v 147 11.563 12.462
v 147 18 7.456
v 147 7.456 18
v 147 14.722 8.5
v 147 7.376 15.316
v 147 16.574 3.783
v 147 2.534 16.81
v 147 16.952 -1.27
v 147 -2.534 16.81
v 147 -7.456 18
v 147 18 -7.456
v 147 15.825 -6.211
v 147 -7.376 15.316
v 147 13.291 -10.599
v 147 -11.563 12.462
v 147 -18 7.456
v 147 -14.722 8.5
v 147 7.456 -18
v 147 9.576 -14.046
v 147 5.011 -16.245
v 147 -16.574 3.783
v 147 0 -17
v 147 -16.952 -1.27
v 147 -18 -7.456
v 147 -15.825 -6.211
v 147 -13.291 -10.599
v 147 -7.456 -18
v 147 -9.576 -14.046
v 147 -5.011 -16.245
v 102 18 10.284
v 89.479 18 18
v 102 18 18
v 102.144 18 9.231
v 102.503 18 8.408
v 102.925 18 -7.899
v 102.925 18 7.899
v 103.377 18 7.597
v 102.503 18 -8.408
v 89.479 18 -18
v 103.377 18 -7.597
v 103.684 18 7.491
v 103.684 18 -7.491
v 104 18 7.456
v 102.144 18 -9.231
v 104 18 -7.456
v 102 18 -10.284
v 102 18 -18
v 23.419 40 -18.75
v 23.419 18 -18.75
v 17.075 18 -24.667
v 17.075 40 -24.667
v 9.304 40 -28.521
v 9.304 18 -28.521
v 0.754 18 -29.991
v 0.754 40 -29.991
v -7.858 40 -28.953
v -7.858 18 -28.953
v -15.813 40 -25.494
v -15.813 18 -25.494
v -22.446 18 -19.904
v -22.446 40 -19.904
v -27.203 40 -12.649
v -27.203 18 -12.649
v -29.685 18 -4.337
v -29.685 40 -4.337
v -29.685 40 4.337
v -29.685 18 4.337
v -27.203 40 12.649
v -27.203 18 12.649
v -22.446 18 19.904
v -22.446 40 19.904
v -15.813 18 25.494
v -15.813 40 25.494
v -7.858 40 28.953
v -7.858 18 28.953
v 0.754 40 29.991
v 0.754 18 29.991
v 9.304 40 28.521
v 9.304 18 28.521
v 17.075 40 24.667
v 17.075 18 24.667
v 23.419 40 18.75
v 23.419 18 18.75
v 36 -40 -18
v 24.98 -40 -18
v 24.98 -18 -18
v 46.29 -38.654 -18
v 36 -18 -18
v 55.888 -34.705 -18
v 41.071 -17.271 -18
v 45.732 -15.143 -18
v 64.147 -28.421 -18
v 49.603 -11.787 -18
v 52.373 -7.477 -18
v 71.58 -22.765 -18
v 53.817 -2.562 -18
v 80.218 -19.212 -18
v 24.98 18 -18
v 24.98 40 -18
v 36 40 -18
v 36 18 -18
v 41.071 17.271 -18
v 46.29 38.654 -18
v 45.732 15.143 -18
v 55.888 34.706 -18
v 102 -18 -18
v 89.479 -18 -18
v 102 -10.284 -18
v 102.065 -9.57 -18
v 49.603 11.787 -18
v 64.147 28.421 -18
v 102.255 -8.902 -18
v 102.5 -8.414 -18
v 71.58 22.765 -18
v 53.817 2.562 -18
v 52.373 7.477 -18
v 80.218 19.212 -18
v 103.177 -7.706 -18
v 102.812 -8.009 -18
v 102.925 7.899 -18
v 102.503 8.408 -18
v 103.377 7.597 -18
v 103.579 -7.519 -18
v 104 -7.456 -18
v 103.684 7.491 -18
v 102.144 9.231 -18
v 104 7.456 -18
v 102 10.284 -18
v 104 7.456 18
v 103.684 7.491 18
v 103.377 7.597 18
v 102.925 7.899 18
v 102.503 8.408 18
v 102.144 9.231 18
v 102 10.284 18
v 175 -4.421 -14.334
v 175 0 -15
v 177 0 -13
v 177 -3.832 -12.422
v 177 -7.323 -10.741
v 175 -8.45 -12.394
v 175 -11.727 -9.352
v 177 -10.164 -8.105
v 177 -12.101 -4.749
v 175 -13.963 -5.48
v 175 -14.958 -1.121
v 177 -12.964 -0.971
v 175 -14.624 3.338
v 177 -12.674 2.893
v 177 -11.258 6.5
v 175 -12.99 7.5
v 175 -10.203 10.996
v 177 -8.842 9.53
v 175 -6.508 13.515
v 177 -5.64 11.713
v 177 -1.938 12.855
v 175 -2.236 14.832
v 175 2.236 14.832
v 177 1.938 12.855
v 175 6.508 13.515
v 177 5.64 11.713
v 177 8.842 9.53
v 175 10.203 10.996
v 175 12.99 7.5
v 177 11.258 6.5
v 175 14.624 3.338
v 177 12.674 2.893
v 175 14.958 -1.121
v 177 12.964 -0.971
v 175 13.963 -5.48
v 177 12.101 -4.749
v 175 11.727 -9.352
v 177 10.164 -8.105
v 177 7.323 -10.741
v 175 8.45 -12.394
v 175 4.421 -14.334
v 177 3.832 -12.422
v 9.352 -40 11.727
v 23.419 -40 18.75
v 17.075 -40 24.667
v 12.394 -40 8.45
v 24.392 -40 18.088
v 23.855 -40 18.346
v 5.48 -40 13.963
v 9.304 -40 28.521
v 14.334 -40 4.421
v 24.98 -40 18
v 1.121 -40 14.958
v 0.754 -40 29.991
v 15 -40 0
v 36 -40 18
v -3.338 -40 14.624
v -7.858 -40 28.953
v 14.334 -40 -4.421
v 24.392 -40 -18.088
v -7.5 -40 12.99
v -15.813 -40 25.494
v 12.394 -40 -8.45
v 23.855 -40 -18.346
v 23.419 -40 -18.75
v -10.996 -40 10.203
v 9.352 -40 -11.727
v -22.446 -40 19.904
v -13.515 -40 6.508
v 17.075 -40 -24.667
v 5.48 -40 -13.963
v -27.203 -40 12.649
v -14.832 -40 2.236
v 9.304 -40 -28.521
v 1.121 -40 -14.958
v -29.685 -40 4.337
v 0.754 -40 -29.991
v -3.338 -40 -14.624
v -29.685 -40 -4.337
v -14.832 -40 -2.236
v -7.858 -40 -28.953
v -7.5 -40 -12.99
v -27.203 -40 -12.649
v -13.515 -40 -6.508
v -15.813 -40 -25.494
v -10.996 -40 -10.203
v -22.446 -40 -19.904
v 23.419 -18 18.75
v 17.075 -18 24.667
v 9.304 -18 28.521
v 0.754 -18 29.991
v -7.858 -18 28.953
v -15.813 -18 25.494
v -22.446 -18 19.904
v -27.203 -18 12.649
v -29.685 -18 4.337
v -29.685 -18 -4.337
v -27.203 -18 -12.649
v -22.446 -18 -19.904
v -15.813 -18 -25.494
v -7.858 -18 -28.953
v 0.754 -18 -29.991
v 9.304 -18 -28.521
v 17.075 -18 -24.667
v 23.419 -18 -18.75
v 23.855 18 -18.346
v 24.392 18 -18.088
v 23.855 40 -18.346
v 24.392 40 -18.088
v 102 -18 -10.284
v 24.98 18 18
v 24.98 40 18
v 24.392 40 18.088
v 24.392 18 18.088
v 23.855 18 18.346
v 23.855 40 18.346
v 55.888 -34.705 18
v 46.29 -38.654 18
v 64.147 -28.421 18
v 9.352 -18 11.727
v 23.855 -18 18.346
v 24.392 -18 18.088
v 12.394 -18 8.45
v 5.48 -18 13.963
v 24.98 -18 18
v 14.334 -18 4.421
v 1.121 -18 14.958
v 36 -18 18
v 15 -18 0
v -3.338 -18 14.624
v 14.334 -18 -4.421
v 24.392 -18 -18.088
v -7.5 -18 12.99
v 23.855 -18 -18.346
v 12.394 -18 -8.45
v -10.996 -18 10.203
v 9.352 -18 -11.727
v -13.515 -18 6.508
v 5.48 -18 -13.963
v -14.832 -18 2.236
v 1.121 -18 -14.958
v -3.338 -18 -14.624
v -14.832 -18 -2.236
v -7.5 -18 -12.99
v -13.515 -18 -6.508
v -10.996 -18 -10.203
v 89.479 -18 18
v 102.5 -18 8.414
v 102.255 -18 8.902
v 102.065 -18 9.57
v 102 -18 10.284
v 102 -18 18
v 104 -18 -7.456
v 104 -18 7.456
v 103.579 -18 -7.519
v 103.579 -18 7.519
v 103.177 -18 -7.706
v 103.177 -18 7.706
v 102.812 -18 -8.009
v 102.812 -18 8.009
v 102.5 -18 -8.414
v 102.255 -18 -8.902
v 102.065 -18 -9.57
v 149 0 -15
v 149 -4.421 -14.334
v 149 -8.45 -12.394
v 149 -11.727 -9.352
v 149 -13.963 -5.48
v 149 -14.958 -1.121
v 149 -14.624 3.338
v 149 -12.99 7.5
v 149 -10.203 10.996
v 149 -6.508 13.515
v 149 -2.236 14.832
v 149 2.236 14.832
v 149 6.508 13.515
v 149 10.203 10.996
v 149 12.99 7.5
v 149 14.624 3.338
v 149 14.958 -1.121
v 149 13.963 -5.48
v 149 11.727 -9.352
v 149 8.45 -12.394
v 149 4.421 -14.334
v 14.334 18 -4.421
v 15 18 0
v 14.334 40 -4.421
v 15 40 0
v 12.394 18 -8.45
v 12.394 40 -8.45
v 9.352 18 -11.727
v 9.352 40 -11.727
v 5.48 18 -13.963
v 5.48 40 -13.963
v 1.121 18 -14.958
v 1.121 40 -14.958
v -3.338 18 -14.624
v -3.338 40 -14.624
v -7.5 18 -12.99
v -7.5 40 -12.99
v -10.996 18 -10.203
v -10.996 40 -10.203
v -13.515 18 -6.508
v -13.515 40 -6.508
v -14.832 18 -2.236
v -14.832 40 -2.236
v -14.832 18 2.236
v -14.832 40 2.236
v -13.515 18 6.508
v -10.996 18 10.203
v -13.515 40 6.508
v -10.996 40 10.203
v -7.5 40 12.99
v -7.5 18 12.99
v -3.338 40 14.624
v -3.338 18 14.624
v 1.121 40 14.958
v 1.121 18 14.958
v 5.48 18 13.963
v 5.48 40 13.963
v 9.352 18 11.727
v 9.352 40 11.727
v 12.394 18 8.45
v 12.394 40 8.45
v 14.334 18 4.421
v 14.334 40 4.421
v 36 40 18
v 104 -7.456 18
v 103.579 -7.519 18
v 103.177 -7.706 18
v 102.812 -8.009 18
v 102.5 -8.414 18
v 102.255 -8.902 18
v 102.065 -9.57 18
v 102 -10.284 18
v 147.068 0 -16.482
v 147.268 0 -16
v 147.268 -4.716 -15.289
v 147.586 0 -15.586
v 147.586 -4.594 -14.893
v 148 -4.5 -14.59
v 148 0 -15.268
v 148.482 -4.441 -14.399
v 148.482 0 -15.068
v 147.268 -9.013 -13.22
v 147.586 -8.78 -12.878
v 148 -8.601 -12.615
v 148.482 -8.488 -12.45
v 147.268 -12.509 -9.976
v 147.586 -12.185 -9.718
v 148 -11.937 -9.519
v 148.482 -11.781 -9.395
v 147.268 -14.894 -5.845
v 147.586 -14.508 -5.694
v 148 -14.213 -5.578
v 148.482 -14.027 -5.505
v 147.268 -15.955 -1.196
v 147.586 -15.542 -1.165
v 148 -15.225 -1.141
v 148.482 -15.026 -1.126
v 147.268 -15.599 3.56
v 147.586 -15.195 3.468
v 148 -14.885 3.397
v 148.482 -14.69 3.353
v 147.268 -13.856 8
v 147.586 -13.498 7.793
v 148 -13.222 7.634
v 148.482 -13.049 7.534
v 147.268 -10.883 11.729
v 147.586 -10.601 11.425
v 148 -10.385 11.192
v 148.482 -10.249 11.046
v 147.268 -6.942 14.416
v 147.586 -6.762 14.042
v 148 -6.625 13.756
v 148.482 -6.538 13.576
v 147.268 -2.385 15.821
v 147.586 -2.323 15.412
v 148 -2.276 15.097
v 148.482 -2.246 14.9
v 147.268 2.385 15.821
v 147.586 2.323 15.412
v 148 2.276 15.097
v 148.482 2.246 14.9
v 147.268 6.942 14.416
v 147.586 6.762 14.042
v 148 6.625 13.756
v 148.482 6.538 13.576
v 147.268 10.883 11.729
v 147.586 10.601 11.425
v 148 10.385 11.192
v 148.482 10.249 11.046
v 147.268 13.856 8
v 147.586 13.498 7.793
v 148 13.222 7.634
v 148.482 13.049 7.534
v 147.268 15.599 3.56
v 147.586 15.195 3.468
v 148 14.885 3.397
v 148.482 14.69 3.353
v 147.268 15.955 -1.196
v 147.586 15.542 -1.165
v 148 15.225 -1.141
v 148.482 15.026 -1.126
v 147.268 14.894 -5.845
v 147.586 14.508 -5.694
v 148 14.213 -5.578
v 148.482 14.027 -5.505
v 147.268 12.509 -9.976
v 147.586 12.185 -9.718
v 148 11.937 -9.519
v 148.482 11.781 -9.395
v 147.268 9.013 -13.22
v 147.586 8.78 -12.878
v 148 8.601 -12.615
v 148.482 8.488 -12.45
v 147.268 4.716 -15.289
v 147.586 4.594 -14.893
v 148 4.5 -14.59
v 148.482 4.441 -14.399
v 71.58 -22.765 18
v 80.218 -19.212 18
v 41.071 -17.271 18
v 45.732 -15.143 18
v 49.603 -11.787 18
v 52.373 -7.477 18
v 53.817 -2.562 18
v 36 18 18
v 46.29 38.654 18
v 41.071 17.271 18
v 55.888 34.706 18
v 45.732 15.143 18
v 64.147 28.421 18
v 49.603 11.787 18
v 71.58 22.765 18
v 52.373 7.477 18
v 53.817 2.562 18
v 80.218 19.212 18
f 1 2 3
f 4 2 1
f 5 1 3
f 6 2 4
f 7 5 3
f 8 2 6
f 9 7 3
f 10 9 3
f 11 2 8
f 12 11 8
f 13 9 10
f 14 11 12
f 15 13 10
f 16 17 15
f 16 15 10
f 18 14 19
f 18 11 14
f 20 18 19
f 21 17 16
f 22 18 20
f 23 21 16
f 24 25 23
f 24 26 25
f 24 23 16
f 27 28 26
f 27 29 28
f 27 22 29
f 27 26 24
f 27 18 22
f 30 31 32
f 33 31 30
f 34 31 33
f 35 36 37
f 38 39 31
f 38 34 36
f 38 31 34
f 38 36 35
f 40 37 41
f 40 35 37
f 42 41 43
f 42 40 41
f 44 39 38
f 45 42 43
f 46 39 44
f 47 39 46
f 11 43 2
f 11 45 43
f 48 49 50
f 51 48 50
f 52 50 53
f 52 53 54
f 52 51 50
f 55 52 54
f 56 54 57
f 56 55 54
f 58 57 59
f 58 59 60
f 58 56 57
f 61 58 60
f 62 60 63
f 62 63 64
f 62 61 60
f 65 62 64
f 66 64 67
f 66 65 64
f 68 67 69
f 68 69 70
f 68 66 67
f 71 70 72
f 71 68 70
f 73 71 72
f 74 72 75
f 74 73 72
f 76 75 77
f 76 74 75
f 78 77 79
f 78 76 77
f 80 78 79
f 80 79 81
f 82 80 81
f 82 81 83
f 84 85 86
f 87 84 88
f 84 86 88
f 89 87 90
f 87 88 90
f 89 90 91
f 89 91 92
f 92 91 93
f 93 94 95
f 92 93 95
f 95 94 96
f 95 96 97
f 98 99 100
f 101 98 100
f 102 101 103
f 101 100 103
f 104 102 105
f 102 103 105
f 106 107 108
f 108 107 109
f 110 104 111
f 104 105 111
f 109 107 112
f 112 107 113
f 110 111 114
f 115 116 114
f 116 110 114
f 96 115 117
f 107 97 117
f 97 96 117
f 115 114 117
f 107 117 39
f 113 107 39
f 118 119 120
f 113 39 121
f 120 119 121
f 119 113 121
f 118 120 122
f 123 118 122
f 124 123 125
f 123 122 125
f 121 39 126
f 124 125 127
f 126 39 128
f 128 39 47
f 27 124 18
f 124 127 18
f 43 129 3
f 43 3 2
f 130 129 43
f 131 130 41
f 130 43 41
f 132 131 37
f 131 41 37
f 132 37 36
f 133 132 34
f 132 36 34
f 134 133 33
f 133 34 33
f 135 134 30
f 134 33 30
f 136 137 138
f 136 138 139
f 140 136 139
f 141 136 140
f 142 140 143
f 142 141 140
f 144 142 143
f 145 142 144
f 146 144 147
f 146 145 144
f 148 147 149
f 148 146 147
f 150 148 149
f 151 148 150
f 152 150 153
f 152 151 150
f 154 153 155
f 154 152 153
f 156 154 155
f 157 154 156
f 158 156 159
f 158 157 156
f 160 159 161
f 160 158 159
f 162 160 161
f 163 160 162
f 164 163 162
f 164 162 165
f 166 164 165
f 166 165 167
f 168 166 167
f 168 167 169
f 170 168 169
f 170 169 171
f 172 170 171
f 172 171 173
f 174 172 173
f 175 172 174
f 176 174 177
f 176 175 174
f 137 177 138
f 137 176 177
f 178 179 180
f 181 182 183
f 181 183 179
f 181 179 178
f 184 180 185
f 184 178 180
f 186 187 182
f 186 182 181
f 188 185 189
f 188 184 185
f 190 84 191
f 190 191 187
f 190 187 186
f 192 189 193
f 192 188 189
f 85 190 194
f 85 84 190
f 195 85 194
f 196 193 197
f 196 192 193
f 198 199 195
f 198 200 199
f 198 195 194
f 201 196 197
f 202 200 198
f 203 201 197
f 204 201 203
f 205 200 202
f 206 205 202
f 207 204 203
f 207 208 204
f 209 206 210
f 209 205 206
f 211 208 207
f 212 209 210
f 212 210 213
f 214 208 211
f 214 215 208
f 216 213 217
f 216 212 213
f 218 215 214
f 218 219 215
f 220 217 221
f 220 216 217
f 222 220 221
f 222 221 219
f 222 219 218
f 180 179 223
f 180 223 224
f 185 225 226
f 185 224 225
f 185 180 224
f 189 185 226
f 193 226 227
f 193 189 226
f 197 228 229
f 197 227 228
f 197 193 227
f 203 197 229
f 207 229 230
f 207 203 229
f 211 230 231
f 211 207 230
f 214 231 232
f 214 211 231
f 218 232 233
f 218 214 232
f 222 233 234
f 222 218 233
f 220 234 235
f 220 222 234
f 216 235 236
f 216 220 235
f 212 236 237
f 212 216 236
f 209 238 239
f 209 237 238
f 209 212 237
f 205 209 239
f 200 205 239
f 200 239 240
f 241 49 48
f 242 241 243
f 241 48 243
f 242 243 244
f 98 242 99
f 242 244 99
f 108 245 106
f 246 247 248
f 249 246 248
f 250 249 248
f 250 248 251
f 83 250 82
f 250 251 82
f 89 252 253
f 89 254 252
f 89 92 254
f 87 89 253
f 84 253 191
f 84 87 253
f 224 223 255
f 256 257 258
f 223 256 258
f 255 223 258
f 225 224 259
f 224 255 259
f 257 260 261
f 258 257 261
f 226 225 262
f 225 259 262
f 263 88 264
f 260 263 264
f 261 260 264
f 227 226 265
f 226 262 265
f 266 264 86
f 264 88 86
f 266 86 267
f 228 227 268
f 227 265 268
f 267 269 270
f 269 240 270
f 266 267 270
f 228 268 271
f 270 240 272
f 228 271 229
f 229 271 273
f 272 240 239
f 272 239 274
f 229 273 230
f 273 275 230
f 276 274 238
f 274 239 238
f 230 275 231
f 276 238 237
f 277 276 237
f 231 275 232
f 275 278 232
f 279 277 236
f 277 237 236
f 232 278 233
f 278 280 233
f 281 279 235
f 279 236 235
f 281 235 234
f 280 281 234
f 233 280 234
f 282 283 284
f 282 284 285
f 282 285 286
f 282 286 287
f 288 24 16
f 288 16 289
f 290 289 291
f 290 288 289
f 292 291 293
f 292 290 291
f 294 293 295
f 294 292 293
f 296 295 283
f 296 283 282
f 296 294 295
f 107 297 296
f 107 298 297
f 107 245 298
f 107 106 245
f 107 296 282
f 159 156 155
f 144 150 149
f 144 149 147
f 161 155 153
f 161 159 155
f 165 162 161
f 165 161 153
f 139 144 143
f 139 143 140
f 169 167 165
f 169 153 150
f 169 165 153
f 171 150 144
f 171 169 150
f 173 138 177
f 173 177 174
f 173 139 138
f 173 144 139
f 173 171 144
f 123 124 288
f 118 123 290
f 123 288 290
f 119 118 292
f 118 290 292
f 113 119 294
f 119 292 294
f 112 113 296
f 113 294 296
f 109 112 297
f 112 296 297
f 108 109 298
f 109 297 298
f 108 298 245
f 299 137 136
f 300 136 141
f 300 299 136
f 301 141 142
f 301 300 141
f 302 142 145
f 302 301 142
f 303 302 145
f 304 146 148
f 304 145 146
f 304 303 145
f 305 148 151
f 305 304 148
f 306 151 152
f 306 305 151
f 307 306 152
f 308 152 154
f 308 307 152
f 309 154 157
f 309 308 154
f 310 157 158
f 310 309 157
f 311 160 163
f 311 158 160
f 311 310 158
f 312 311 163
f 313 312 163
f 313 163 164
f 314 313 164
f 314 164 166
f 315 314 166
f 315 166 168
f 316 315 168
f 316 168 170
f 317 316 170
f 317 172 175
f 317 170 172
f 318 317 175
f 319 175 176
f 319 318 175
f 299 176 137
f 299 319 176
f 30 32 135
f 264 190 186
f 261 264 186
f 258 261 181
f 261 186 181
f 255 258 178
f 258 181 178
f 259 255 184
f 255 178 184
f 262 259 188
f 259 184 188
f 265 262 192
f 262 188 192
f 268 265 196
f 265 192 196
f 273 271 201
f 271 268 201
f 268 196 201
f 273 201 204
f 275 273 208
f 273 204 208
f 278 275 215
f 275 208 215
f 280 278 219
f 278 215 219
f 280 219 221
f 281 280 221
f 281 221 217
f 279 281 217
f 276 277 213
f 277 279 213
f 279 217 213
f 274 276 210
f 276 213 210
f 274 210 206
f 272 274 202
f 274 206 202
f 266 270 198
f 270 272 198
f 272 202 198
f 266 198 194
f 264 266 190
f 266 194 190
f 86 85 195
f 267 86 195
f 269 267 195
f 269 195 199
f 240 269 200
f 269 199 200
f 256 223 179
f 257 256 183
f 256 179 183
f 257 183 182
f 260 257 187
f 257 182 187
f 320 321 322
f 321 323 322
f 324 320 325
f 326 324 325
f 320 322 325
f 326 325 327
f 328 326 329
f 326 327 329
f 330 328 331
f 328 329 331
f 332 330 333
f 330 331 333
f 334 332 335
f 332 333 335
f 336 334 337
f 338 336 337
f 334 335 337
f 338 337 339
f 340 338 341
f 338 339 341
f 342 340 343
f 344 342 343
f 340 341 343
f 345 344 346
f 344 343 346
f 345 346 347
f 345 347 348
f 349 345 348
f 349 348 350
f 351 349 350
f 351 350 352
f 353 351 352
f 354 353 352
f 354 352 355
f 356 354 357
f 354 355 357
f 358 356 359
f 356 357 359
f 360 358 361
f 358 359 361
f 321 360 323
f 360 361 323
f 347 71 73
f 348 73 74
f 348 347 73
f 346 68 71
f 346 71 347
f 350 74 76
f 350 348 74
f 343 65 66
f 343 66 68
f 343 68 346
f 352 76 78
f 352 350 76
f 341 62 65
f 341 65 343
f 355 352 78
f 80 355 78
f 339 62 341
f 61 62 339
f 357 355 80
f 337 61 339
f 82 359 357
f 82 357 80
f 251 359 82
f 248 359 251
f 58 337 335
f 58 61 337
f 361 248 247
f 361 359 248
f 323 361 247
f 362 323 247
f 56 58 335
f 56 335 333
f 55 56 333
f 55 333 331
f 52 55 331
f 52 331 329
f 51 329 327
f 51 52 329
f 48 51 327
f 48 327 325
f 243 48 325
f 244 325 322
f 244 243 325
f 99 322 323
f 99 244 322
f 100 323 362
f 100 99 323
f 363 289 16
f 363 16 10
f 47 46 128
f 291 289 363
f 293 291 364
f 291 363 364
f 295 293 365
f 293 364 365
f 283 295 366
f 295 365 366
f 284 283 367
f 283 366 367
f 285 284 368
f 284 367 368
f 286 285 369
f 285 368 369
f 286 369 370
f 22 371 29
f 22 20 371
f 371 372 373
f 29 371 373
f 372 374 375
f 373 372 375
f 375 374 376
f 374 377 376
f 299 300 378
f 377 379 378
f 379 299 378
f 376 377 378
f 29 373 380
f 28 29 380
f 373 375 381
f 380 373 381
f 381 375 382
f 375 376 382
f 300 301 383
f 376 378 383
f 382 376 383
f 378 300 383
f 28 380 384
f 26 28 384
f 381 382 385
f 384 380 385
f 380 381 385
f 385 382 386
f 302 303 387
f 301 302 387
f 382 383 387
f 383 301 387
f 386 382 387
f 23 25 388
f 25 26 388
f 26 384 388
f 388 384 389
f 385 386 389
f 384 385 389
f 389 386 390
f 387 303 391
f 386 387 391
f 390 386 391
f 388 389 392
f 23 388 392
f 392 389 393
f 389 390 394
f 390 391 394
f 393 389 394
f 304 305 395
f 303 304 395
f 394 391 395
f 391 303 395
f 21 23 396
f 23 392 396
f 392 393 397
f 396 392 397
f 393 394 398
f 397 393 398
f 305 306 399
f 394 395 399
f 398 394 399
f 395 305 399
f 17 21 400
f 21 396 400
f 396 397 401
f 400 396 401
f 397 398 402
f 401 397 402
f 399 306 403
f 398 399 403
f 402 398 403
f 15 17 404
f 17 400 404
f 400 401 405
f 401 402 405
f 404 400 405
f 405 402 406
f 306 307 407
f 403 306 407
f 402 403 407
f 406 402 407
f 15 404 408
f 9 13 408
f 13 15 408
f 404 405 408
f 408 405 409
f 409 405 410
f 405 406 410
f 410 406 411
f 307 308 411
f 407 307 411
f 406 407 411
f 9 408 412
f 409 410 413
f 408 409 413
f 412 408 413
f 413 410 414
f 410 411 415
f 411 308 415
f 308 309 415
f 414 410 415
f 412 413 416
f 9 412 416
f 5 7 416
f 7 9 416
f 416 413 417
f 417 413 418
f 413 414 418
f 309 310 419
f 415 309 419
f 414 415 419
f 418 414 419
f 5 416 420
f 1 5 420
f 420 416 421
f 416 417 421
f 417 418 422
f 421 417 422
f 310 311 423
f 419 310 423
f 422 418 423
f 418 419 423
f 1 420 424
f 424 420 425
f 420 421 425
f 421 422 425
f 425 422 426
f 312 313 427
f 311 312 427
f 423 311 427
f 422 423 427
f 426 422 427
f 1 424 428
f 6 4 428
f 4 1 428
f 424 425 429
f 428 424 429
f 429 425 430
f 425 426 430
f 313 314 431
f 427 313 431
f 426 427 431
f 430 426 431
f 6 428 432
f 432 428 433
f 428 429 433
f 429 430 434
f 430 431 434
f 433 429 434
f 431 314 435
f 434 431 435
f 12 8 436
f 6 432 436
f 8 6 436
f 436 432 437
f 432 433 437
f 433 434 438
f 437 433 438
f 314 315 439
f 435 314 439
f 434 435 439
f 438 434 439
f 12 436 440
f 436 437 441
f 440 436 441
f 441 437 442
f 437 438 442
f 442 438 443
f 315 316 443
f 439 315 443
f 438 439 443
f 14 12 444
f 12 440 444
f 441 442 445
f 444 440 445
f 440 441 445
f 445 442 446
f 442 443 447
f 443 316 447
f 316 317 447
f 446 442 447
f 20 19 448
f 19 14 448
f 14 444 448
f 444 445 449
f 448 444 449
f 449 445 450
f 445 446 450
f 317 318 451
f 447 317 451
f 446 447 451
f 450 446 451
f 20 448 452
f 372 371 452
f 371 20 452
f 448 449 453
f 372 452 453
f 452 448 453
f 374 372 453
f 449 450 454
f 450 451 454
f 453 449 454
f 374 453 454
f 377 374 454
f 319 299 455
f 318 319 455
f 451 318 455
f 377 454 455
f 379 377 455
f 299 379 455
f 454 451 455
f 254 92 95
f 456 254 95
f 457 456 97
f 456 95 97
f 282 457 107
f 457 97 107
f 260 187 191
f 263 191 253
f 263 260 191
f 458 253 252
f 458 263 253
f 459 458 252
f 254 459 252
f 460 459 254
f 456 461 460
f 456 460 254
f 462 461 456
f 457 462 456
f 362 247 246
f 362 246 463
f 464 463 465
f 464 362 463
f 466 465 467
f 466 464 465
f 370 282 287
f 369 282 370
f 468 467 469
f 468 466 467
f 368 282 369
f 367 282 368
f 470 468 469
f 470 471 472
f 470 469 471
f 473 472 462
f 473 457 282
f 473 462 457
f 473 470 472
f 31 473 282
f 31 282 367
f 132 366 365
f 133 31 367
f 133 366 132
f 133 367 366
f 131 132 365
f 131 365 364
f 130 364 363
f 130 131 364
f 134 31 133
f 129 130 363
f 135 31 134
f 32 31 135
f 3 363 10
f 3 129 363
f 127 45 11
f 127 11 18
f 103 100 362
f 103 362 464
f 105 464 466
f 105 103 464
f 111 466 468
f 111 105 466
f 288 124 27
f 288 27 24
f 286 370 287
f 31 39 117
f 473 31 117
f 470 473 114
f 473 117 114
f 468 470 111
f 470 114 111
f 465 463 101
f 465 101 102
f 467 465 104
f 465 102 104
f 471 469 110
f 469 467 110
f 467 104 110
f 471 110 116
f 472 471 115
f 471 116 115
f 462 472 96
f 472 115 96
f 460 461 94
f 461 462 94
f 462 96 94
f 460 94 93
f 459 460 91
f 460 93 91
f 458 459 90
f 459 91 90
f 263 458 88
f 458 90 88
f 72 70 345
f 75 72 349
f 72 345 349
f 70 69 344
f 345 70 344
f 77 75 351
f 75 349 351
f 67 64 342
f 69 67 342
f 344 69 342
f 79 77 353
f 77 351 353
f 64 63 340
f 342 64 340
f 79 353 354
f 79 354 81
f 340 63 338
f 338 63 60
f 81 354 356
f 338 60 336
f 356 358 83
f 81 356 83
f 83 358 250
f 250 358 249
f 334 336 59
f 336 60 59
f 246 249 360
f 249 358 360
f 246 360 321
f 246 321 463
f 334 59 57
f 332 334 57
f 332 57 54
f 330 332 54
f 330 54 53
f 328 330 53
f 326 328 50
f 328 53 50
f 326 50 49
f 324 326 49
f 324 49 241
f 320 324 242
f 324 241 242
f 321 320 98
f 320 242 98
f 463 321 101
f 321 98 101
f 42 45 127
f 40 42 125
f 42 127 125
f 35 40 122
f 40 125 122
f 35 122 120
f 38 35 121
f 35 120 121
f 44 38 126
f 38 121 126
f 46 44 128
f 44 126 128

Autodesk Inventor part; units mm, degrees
ref_plane "YZ Plane" through (0, 0, 0) normal (1, 0, 0) x (0, 1, 0)
ref_plane "XZ Plane" through (0, 0, 0) normal (0, 1, 0) x (-1, 0, 0)
ref_plane "XY Plane" through (0, 0, 0) normal (0, 0, 1) x (1, 0, 0)
sketch "Sketch2" plane through (0, 0, 0) normal (0, 0, 1) x (1, 0, 0)
  line L0 (0, 18) -> (36, 18)
  line L1 (36, -18) -> (0, -18)
  arc A0 (36, -18) -> (36, 18) centre (36, 0) ccw
  line L2 (0, 40) -> (36, 40)
  line L3 (36, -40) -> (0, -40)
  line L4 (0, 40) -> (0, 18)
  line L5 (0, -18) -> (0, -40)
  line L6 (89.479, 18) -> (147, 18)
  line L7 (147, 18) -> (147, -18)
  line L8 (147, -18) -> (89.479, -18)
  arc A1 (36, -40) -> (64.1468, -28.4211) centre (36, 0) ccw
  arc A2 (64.1468, 28.4211) -> (36, 40) centre (36, 0) ccw
  line L9 (0, 75.6) -> (0, -75.6) projected
  arc A3 (64.1468, 28.4211) -> (89.479, 18) centre (89.479, 54) ccw
  arc A4 (89.479, -18) -> (64.1468, -28.4211) centre (89.479, -54) ccw
  point P0 (0, 0)
  point P1 (0, 0)
  point P2 (71.7211, 18)
  point P3 (71.7211, -18)
  dimension "d3" = 147
  dimension "d4" = 36
  dimension "d5" = 18
  dimension "d6" = 36
extrude "Extrusion1" add sketch "Sketch2" along normal mid plane 36 contours L4 L2 A2 A3 L6 L7 L8 A4 A1 L3 L5 L1 A0 L0
sketch "Sketch3" plane through (0, 40, 18) normal (0, 1, 0) x (1, 0, 0)
  circle A0 centre (0, 18) radius 30
  dimension "d11" = 60
extrude "Extrusion2" add sketch "Sketch3" against normal blind 22
sketch "Sketch4" plane through (36, 40, 18) normal (0, 1, 0) x (1, 0, 0)
  circle A0 centre (-36, 18) radius 15
  dimension "d14" = 30
extrude "Extrusion3" cut sketch "Sketch4" against normal blind 22
mirror "Mirror1" about plane through (0, 0, 0) normal (0, 1, 0) of "Extrusion3", "Extrusion2"
sketch "Sketch5" plane through (147, -18, 18) normal (1, 0, 0) x (0, 0, -1)
  line L0 (36, 36) -> (36, 0) projected
  line L1 (36, 10.5442) -> (25.4558, 0)
  line L2 (25.4558, 0) -> (10.5442, 0)
  line L3 (10.5442, 0) -> (0, 10.5442)
  line L4 (0, 10.5442) -> (0, 25.4558)
  line L5 (0, 25.4558) -> (10.5442, 36)
  line L6 (10.5442, 36) -> (25.4558, 36)
  line L7 (25.4558, 36) -> (36, 25.4558)
  line L8 (36, 25.4558) -> (36, 10.5442)
  line L9 (36, 36) -> (0, 36) projected
  line L10 (0, 0) -> (0, 36) projected
  line L11 (36, 0) -> (0, 0) projected
  line L12 (36, 36) -> (36, 0) projected
  point P0 (18, 18)
  point P1 (18, 18)
  point P2 (36, 18)
  point P3 (36, 36)
  point P4 (36, 0)
extrude "Extrusion4" cut sketch "Sketch5" against normal blind 45 contours L0 L7 L9 | L0 L11 L1 | L5 L10 L9 | L11 L10 L3
sketch "Sketch6" plane through (147, -7.4558, 18) normal (1, 0, 0) x (0, 0, -1)
  circle A0 centre (18, 7.4558) radius 15
  dimension "d19" = 30
extrude "Extrusion5" add sketch "Sketch6" along normal blind 30
fillet "Fillet1" radius 2 9 edges at (24, 29, 18) (24, -29, 18) (102, 12.7279, 12.7279) (147, 0, 15) (24, 29, -18) (24, -29, -18) (102, 12.7279, -12.7279) (102, -12.7279, -12.7279) (102, -12.7279, 12.7279)
chamfer "Chamfer1" distance 2 angle 45 1 edges at (177, 0, 15)
properties part number "fork end"
